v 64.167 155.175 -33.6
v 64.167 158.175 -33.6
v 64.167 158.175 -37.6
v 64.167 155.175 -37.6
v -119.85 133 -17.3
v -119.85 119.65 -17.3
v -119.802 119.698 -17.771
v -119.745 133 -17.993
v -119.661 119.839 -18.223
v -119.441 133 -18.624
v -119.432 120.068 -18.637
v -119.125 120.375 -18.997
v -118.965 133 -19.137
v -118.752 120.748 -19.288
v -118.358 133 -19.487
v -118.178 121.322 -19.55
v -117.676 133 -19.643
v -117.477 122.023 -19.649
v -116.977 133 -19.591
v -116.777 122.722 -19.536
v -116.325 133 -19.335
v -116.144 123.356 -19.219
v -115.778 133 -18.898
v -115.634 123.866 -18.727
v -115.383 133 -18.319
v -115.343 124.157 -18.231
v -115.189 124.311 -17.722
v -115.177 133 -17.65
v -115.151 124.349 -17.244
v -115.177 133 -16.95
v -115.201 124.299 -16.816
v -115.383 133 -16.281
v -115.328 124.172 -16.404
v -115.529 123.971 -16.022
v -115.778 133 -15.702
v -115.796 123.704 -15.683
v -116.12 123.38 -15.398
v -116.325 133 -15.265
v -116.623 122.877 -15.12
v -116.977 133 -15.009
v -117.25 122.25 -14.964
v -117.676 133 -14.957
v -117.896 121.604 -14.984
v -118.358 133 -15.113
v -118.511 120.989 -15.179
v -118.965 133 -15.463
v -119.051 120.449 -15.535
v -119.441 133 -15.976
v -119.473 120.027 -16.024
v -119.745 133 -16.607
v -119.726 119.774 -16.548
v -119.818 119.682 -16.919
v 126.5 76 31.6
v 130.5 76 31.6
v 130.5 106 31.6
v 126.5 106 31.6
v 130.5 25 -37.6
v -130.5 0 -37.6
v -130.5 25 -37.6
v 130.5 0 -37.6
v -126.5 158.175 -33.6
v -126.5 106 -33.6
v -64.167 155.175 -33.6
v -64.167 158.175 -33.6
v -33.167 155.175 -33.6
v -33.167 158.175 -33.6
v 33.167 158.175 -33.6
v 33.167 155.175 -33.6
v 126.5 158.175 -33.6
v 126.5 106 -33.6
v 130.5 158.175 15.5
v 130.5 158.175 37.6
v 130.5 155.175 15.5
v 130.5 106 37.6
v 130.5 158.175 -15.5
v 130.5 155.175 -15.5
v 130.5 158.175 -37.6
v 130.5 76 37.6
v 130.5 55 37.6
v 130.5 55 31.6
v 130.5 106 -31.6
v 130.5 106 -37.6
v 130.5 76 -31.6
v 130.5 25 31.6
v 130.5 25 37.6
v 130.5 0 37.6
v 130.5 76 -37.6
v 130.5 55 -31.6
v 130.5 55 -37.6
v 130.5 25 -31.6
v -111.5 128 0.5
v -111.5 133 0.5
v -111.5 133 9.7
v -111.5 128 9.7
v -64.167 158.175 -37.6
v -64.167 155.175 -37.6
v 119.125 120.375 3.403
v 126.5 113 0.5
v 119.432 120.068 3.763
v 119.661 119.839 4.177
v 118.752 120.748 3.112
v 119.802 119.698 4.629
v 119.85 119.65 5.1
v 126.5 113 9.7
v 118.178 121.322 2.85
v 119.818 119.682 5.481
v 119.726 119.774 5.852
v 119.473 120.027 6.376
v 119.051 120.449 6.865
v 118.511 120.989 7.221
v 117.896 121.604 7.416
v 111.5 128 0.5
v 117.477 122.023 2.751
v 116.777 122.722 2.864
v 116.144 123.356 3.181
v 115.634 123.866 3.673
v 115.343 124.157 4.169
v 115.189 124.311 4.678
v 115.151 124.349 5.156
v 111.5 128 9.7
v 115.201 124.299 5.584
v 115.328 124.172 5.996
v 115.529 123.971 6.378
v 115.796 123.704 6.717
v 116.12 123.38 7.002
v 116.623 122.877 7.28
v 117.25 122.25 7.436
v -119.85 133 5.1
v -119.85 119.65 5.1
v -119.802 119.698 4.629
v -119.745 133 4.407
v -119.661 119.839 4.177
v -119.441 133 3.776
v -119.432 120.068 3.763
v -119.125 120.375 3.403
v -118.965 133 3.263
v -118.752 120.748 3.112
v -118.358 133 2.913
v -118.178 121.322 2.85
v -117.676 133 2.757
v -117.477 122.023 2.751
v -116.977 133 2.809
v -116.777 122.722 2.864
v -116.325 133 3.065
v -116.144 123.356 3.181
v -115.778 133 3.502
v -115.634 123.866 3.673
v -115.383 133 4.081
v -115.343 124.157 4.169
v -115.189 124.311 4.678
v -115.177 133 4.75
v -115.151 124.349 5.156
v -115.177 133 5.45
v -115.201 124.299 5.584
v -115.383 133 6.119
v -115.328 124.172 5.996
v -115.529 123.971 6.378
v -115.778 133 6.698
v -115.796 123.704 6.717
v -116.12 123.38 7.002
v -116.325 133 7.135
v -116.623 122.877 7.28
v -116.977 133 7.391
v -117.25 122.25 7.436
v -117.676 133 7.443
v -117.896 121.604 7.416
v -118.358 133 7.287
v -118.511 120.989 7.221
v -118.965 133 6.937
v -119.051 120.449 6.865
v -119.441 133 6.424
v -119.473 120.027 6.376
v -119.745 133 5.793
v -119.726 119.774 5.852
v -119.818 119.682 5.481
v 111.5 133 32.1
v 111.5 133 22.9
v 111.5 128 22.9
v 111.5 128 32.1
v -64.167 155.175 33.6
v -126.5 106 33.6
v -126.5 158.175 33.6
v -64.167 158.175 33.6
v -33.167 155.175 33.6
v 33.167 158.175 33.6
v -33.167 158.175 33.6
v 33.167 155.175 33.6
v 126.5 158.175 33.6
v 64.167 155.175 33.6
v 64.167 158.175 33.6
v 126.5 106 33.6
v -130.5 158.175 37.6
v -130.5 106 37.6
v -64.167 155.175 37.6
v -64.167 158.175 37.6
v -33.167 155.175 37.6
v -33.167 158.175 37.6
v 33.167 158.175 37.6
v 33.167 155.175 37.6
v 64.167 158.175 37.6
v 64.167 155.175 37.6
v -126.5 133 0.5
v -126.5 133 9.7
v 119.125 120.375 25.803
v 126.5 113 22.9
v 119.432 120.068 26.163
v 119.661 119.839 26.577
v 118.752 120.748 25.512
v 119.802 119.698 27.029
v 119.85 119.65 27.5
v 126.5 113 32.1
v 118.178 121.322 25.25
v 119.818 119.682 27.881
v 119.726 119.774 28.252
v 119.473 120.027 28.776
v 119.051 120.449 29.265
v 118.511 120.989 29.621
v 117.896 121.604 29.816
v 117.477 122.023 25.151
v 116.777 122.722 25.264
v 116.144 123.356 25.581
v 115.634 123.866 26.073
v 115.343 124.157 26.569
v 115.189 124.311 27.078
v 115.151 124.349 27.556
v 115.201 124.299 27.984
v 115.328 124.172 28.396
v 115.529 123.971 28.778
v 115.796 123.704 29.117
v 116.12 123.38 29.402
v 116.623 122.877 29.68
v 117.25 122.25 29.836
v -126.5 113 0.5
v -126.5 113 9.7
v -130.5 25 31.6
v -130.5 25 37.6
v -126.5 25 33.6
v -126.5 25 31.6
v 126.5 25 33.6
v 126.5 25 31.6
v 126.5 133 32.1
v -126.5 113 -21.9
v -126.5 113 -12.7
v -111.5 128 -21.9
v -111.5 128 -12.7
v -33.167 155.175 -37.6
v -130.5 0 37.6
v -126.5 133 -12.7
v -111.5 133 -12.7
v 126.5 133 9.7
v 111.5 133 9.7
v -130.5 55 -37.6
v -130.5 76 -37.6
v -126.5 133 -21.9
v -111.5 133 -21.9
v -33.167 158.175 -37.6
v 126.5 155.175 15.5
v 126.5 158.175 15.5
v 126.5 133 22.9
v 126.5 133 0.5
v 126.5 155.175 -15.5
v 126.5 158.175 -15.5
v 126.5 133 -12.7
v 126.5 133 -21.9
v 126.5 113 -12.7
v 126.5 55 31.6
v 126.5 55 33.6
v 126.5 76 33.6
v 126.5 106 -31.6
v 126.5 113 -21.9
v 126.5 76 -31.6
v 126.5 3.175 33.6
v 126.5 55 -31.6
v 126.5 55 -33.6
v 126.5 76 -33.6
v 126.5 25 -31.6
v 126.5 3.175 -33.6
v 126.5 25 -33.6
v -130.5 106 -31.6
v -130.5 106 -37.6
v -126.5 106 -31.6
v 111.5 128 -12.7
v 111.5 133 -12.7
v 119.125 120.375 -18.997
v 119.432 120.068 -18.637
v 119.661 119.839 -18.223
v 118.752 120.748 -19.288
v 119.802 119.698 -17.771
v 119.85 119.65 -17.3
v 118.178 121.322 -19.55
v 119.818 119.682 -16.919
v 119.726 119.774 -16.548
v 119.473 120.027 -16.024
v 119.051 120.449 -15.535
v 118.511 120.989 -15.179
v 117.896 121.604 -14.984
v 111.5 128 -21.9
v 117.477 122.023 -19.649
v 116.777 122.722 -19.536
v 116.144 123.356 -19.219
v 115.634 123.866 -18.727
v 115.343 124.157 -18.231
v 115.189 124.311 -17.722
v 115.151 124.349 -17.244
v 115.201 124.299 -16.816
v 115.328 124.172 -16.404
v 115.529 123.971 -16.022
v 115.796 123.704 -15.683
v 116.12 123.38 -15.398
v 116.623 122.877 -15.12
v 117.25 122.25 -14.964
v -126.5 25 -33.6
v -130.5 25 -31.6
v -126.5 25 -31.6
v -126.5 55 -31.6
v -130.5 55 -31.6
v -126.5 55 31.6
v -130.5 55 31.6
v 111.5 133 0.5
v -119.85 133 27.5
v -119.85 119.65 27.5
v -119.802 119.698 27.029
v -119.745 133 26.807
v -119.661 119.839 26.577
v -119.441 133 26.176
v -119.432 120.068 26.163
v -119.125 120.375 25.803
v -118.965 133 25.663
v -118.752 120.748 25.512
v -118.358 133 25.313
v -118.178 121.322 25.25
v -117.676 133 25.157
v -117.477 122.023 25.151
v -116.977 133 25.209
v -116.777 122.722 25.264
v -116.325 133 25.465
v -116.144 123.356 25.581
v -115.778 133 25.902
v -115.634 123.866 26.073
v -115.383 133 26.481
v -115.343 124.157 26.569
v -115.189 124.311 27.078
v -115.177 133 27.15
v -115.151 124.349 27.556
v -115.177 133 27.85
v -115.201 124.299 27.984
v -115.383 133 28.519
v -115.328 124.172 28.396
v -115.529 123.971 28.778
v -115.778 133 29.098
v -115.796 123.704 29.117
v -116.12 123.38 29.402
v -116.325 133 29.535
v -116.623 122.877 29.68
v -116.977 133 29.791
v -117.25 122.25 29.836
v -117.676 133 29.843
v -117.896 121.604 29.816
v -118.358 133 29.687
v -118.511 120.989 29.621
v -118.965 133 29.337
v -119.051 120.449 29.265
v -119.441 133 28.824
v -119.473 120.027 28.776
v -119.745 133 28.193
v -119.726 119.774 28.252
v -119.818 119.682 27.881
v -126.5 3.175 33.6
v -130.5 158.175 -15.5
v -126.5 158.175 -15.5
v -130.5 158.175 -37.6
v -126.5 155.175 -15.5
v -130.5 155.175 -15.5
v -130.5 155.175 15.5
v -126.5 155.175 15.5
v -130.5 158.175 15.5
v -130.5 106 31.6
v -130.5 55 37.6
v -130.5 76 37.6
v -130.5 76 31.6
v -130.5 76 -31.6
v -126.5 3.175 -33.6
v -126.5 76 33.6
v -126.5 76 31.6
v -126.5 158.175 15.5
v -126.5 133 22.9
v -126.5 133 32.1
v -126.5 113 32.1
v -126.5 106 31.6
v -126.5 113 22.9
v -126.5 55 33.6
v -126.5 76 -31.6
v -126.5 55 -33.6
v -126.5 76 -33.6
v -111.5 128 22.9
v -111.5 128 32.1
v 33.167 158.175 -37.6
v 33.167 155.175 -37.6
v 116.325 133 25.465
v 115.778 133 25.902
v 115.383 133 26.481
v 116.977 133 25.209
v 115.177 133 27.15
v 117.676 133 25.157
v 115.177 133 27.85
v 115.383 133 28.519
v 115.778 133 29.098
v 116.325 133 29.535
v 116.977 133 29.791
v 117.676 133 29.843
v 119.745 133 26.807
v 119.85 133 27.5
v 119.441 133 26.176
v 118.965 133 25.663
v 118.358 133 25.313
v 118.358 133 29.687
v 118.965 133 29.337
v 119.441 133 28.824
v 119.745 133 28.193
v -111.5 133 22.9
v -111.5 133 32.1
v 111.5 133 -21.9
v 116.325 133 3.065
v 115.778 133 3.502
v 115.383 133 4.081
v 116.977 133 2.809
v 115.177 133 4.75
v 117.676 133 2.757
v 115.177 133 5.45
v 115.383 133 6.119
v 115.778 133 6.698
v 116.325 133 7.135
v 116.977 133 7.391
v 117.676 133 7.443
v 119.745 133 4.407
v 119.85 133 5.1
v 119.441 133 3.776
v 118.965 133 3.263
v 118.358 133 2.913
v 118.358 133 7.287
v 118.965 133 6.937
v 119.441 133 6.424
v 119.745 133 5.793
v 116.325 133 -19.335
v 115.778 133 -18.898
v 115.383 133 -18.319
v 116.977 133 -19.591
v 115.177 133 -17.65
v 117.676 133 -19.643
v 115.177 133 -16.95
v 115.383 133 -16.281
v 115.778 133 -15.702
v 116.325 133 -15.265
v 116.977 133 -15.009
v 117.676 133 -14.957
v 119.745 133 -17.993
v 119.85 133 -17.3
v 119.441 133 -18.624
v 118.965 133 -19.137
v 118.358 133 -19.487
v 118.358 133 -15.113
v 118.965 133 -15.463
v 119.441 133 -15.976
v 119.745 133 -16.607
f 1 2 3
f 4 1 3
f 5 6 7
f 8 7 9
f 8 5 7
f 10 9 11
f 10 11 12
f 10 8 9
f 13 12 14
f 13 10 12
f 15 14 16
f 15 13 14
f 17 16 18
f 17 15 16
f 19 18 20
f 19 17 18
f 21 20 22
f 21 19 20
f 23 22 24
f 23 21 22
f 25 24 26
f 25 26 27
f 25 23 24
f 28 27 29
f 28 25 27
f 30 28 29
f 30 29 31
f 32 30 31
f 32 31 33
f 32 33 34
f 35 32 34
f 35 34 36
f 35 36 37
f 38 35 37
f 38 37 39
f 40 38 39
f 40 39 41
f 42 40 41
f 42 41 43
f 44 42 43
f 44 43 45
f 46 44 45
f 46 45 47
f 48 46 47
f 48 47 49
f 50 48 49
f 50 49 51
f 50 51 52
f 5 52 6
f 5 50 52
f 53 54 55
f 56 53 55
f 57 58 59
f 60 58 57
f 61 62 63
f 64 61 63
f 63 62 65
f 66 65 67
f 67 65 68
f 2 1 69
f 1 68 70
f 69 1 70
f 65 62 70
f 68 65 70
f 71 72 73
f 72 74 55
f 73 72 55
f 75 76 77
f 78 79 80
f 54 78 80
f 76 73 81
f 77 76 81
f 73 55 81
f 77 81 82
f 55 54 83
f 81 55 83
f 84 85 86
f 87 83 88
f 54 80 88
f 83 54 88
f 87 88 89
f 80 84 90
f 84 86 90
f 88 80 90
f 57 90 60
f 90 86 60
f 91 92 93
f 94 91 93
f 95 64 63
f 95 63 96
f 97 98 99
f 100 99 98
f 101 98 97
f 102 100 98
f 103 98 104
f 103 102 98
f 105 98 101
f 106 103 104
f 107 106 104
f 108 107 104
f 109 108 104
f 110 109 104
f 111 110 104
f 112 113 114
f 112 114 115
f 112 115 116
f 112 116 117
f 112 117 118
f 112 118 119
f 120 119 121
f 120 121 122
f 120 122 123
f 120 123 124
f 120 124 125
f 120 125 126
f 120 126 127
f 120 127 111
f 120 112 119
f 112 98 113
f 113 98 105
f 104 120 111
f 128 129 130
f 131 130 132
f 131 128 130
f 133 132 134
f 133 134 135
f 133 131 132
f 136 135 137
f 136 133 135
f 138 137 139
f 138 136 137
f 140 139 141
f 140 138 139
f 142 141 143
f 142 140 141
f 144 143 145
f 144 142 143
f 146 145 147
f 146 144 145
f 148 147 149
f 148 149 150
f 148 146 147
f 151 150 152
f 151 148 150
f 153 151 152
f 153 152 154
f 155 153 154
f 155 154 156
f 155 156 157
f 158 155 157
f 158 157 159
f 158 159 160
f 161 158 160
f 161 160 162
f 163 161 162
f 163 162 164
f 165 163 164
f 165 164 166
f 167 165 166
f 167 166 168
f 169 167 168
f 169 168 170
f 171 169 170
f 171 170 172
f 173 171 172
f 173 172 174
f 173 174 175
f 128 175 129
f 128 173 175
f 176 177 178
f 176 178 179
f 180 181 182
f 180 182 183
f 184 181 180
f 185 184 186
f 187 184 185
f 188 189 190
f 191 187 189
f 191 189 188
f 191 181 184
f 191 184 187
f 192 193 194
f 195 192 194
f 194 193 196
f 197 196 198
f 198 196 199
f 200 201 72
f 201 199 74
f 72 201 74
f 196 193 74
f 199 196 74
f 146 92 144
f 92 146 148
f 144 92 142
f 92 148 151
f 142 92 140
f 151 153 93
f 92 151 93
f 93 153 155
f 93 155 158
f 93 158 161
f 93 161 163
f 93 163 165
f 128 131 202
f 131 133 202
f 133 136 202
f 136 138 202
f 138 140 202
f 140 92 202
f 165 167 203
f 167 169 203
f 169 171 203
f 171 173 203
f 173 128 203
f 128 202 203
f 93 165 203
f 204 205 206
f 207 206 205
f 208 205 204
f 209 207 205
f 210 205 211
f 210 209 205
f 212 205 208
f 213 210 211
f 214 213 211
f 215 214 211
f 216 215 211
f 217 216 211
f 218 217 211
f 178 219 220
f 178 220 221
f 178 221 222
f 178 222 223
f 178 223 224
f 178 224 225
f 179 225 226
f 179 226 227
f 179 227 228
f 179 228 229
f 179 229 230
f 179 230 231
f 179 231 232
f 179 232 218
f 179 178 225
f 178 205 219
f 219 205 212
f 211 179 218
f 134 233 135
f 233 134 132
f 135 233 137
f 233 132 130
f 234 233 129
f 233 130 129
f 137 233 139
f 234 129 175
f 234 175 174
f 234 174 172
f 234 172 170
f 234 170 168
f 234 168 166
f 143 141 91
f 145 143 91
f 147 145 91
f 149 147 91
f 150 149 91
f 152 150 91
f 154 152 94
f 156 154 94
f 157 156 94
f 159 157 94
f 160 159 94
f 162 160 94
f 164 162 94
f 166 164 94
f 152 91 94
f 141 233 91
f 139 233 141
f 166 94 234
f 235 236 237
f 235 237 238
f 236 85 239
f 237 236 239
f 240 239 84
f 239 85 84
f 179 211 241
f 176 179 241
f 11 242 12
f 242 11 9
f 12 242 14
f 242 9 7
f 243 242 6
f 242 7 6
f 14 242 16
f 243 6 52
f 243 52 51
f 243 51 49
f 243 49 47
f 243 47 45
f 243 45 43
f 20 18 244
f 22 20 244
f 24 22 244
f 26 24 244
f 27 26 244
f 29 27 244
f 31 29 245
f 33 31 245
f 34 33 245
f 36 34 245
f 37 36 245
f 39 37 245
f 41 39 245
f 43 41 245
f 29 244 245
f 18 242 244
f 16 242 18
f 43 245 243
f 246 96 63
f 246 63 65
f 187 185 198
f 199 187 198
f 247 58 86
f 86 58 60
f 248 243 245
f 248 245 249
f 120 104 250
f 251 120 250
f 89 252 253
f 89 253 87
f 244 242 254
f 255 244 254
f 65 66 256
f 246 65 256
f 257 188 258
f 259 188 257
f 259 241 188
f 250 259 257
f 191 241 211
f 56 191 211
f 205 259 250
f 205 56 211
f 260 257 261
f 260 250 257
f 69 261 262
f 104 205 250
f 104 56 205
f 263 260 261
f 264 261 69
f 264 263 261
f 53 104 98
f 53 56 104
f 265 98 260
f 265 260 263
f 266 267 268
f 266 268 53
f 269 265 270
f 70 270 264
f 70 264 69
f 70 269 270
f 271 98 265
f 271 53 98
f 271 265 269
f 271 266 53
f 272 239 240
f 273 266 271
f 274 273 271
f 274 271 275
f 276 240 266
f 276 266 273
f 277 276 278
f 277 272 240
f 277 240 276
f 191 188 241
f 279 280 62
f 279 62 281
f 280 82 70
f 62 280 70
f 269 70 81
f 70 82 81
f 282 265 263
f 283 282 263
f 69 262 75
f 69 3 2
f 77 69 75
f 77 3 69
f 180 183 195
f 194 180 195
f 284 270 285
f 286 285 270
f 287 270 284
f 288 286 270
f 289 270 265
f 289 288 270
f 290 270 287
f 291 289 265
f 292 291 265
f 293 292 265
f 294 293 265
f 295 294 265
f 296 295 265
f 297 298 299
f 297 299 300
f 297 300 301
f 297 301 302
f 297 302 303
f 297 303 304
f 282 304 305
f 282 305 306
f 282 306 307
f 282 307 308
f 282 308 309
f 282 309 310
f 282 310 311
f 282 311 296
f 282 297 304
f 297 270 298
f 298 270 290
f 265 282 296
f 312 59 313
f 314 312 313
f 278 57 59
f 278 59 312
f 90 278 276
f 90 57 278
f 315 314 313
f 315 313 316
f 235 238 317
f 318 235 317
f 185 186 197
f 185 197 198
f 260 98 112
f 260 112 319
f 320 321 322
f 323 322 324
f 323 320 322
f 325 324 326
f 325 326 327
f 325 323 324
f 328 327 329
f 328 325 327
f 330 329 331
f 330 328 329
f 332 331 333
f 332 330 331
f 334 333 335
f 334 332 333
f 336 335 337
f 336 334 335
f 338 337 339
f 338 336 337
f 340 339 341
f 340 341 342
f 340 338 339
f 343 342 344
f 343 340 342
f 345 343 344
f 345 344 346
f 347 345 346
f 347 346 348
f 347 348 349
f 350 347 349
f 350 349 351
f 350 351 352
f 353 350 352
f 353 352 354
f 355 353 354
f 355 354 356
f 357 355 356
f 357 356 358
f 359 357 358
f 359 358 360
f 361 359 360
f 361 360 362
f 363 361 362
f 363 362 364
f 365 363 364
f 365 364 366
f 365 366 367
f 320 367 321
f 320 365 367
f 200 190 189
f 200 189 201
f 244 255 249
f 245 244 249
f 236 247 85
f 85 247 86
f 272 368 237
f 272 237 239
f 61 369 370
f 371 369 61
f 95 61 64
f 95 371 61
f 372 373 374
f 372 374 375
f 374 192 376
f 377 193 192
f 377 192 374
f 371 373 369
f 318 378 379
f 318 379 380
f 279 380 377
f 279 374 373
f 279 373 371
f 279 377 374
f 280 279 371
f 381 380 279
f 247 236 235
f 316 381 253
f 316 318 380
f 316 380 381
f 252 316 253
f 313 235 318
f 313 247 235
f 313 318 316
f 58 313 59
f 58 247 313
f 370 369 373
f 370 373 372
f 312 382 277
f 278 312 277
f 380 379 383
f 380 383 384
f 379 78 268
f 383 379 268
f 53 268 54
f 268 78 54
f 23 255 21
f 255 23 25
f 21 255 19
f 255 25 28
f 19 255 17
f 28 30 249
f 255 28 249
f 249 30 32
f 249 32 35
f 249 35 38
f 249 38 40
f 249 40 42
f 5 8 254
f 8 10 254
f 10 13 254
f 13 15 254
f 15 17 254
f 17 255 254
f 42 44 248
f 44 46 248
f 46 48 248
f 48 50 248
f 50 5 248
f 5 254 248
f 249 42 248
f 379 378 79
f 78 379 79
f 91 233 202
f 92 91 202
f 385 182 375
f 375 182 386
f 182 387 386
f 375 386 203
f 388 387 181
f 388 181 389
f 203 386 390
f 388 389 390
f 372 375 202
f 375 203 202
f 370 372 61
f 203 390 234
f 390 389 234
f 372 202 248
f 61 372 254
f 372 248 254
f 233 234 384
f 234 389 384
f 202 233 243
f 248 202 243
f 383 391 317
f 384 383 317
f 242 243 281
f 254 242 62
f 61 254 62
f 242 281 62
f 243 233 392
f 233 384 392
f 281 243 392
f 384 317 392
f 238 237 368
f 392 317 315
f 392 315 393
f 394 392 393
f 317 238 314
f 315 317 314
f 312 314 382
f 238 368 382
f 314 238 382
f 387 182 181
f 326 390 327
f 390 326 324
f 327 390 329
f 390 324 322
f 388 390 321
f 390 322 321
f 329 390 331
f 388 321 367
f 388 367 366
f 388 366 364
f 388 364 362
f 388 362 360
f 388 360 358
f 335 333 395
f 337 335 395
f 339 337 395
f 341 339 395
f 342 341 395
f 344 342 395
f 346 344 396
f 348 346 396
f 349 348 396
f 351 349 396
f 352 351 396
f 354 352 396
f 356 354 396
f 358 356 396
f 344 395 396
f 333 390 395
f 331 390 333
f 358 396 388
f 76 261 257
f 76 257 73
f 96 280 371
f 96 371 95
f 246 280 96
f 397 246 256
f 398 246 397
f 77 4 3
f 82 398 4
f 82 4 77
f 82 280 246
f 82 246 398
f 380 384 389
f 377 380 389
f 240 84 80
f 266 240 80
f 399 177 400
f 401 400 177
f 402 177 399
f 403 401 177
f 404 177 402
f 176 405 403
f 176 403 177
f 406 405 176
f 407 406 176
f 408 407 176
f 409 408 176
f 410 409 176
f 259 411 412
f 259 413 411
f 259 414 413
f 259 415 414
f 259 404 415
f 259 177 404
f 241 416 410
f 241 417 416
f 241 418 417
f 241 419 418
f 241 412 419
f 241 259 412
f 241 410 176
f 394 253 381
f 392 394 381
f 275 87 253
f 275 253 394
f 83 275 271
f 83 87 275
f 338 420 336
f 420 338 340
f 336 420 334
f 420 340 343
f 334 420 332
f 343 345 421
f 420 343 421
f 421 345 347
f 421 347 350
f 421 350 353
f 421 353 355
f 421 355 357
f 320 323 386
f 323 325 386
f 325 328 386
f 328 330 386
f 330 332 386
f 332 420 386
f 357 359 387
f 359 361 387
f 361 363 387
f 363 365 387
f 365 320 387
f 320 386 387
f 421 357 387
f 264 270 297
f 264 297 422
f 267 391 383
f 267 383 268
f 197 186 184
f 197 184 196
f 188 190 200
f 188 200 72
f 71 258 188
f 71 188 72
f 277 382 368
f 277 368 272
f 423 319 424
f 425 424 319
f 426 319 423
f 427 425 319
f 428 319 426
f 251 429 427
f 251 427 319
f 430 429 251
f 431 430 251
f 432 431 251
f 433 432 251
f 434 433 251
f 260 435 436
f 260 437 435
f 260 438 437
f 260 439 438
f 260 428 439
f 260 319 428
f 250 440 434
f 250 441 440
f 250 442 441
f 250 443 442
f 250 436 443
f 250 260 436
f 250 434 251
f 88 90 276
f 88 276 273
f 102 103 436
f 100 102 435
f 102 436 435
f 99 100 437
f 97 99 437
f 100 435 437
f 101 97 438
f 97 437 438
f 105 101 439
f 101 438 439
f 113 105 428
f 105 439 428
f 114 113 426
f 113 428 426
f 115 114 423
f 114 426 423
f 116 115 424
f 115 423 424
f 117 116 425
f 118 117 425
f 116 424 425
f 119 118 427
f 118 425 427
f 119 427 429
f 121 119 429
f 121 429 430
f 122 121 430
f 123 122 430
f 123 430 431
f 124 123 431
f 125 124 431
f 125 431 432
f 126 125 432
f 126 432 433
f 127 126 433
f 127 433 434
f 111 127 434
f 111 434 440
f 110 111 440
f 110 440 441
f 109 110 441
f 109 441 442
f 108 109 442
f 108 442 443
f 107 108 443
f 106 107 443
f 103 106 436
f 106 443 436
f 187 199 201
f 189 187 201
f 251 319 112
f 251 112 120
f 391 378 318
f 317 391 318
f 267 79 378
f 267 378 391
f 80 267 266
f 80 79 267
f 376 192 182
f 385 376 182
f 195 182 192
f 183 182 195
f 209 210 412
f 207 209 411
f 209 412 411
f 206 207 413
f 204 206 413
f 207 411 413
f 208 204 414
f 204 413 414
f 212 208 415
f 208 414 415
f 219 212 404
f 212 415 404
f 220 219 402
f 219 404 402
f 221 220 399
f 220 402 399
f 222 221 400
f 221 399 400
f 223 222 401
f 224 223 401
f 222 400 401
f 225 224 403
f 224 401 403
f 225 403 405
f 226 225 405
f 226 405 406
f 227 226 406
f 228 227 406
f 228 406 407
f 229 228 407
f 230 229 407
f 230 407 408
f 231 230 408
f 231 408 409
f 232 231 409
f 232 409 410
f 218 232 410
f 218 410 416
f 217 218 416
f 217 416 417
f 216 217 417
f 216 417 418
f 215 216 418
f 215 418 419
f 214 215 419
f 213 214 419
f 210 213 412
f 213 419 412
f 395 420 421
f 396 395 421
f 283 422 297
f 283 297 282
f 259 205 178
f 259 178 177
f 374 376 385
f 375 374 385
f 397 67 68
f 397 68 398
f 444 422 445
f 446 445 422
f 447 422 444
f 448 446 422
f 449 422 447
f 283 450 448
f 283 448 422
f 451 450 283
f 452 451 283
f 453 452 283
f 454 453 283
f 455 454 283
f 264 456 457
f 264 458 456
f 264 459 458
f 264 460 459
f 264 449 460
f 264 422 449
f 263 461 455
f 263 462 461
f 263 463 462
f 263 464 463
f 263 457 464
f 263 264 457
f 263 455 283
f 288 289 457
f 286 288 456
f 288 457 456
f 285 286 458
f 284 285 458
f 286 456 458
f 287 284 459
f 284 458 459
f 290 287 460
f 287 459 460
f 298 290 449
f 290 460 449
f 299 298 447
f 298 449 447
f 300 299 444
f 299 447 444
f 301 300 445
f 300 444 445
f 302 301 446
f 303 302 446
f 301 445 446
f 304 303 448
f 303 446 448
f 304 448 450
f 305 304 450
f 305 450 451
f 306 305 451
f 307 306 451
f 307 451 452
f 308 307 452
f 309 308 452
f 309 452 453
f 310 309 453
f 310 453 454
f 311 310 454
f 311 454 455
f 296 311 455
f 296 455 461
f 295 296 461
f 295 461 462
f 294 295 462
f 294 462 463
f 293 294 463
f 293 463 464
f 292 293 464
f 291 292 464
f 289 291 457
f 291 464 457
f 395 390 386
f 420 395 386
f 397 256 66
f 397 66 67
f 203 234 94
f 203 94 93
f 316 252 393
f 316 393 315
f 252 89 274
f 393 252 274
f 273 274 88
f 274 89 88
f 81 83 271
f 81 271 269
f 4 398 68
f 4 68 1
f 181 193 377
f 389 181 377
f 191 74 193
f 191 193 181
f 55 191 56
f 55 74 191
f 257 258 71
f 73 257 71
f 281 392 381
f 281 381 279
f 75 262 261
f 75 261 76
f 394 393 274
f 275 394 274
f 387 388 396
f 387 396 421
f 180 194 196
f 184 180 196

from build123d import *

# Parameters (mm, degrees)
SKETCH1_W                        = 261
SKETCH1_H                        = 75.2
BOSS_EXTRUDE1_DEPTH              = 3.175
SKETCH2_W                        = 261
SKETCH2_H                        = 75.2
SKETCH2_W_2                      = 253
SKETCH2_H_2                      = 67.2
BOSS_EXTRUDE2_DEPTH              = 155
SKETCH3_W                        = 6
SKETCH3_H                        = 30
CUT_EXTRUDE1_DEPTH               = 308.496488801
SKETCH4_W                        = 9.2
SKETCH4_H                        = 20
BOSS_EXTRUDE3_DEPTH              = 15
CHAMFER2_SIZE                    = 15
F_13_0_185_DIAMETER_HOLE1_REACH  = 192.087
F_13_0_185_DIAMETER_HOLE1_BORE_R = 2.3495
LPATTERN1_COUNT                  = 3
LPATTERN1_PITCH                  = 22.4
SKETCH7_W                        = 4
SKETCH7_H                        = 15.5
SKETCH7_W_2                      = 31
SKETCH7_H_2                      = 4
CUT_EXTRUDE2_DEPTH               = 3


# Read off the part's stored shape, not the designer's step: Mirror2
with BuildPart() as part:
    # Sketch1 → Boss-Extrude1 (new body)
    with BuildSketch(Plane(origin=(0, 0, 0), x_dir=(1, 0, 0), z_dir=(0, 1, 0))):
        Rectangle(SKETCH1_W, SKETCH1_H)
    extrude(amount=BOSS_EXTRUDE1_DEPTH)

    # Sketch2 → Boss-Extrude2 (add)
    with BuildSketch(Plane(origin=(0, 3.175, 0), x_dir=(1, 0, 0), z_dir=(0, 1, 0))):
        Rectangle(SKETCH2_W, SKETCH2_H)
        Rectangle(SKETCH2_W_2, SKETCH2_H_2, mode=Mode.SUBTRACT)
    extrude(amount=BOSS_EXTRUDE2_DEPTH)

    # Sketch3 → Cut-Extrude1 (cut, through all)
    with BuildSketch(Plane(origin=(130.5, 0, 0), x_dir=(0, 0, -1), z_dir=(1, 0, 0))):
        with Locations((-34.6, 91)):
            Rectangle(SKETCH3_W, SKETCH3_H)
        with Locations((-34.6, 40)):
            Rectangle(SKETCH3_W, SKETCH3_H)
    cut_extrude1 = extrude(amount=-CUT_EXTRUDE1_DEPTH, mode=Mode.SUBTRACT)

    # Mirror1: Cut-Extrude1 across plane
    add(cut_extrude1.mirror(Plane.XY), mode=Mode.SUBTRACT)

    # Sketch4 → Boss-Extrude3 (add)
    with BuildSketch(Plane.ZY.offset(-126.5)):
        with Locations((-17.3, 123)):
            Rectangle(SKETCH4_W, SKETCH4_H)
        with Locations((27.5, 123)):
            Rectangle(SKETCH4_W, SKETCH4_H)
        with Locations((5.1, 123)):
            Rectangle(SKETCH4_W, SKETCH4_H)
    extrude(amount=BOSS_EXTRUDE3_DEPTH)

    # Chamfer2
    chamfer2_edges = [part.edges().sort_by_distance(p)[0] for p in [
        (111.5, 113, 27.5),
        (111.5, 113, 5.1),
        (111.5, 113, -17.3),
    ]]
    chamfer(chamfer2_edges, length=CHAMFER2_SIZE - 0.0001)  # a hair under: the kernel refuses the full size

    # #13 (0.185) Diameter Hole1 bore → #13 (0.185) Diameter Hole1 (cut, up to next)
    with BuildSketch(Plane(origin=(0, 133, 0), x_dir=(1, 0, 0), z_dir=(0, 1, 0)), mode=Mode.PRIVATE) as f_13_0_185_diameter_hole1_sk1:
        with Locations((117.5, -27.5)):
            Circle(F_13_0_185_DIAMETER_HOLE1_BORE_R)
    f_13_0_185_diameter_hole1_tool1 = extrude(f_13_0_185_diameter_hole1_sk1.sketch, amount=-F_13_0_185_DIAMETER_HOLE1_REACH, mode=Mode.PRIVATE) & part.part
    f_13_0_185_diameter_hole1 = f_13_0_185_diameter_hole1_tool1.solids().sort_by_distance((117.5, 133, 27.5))[0]
    add(f_13_0_185_diameter_hole1, mode=Mode.SUBTRACT)

    # LPattern1: #13 (0.185) Diameter Hole1 ×3
    with Locations(*[(0, 0, -i * LPATTERN1_PITCH) for i in range(1, LPATTERN1_COUNT)]):
        add(f_13_0_185_diameter_hole1, mode=Mode.SUBTRACT)

    # Mirror2: part across plane


with BuildPart() as part_1:
    add(part.part)
    add(part.part.mirror(Plane(origin=(0, 0, 0), x_dir=(0, 0, 1), z_dir=(1, 0, 0))))

    # Sketch7 → Cut-Extrude2 (cut)
    with BuildSketch(Plane(origin=(0, 158.175, 0), x_dir=(1, 0, 0), z_dir=(0, 1, 0))):
        with Locations((128.5, 7.75)):
            Rectangle(SKETCH7_W, SKETCH7_H)
        with Locations((48.666666667, 35.6)):
            Rectangle(SKETCH7_W_2, SKETCH7_H_2)
        with Locations((-128.5, 7.75)):
            Rectangle(SKETCH7_W, SKETCH7_H)
        with Locations((-48.666666667, 35.6)):
            Rectangle(SKETCH7_W_2, SKETCH7_H_2)
    cut_extrude2 = extrude(amount=-CUT_EXTRUDE2_DEPTH, mode=Mode.SUBTRACT)

    # Mirror3: Cut-Extrude2 across plane
    add(cut_extrude2.mirror(Plane.XY), mode=Mode.SUBTRACT)


solid = part_1.part
